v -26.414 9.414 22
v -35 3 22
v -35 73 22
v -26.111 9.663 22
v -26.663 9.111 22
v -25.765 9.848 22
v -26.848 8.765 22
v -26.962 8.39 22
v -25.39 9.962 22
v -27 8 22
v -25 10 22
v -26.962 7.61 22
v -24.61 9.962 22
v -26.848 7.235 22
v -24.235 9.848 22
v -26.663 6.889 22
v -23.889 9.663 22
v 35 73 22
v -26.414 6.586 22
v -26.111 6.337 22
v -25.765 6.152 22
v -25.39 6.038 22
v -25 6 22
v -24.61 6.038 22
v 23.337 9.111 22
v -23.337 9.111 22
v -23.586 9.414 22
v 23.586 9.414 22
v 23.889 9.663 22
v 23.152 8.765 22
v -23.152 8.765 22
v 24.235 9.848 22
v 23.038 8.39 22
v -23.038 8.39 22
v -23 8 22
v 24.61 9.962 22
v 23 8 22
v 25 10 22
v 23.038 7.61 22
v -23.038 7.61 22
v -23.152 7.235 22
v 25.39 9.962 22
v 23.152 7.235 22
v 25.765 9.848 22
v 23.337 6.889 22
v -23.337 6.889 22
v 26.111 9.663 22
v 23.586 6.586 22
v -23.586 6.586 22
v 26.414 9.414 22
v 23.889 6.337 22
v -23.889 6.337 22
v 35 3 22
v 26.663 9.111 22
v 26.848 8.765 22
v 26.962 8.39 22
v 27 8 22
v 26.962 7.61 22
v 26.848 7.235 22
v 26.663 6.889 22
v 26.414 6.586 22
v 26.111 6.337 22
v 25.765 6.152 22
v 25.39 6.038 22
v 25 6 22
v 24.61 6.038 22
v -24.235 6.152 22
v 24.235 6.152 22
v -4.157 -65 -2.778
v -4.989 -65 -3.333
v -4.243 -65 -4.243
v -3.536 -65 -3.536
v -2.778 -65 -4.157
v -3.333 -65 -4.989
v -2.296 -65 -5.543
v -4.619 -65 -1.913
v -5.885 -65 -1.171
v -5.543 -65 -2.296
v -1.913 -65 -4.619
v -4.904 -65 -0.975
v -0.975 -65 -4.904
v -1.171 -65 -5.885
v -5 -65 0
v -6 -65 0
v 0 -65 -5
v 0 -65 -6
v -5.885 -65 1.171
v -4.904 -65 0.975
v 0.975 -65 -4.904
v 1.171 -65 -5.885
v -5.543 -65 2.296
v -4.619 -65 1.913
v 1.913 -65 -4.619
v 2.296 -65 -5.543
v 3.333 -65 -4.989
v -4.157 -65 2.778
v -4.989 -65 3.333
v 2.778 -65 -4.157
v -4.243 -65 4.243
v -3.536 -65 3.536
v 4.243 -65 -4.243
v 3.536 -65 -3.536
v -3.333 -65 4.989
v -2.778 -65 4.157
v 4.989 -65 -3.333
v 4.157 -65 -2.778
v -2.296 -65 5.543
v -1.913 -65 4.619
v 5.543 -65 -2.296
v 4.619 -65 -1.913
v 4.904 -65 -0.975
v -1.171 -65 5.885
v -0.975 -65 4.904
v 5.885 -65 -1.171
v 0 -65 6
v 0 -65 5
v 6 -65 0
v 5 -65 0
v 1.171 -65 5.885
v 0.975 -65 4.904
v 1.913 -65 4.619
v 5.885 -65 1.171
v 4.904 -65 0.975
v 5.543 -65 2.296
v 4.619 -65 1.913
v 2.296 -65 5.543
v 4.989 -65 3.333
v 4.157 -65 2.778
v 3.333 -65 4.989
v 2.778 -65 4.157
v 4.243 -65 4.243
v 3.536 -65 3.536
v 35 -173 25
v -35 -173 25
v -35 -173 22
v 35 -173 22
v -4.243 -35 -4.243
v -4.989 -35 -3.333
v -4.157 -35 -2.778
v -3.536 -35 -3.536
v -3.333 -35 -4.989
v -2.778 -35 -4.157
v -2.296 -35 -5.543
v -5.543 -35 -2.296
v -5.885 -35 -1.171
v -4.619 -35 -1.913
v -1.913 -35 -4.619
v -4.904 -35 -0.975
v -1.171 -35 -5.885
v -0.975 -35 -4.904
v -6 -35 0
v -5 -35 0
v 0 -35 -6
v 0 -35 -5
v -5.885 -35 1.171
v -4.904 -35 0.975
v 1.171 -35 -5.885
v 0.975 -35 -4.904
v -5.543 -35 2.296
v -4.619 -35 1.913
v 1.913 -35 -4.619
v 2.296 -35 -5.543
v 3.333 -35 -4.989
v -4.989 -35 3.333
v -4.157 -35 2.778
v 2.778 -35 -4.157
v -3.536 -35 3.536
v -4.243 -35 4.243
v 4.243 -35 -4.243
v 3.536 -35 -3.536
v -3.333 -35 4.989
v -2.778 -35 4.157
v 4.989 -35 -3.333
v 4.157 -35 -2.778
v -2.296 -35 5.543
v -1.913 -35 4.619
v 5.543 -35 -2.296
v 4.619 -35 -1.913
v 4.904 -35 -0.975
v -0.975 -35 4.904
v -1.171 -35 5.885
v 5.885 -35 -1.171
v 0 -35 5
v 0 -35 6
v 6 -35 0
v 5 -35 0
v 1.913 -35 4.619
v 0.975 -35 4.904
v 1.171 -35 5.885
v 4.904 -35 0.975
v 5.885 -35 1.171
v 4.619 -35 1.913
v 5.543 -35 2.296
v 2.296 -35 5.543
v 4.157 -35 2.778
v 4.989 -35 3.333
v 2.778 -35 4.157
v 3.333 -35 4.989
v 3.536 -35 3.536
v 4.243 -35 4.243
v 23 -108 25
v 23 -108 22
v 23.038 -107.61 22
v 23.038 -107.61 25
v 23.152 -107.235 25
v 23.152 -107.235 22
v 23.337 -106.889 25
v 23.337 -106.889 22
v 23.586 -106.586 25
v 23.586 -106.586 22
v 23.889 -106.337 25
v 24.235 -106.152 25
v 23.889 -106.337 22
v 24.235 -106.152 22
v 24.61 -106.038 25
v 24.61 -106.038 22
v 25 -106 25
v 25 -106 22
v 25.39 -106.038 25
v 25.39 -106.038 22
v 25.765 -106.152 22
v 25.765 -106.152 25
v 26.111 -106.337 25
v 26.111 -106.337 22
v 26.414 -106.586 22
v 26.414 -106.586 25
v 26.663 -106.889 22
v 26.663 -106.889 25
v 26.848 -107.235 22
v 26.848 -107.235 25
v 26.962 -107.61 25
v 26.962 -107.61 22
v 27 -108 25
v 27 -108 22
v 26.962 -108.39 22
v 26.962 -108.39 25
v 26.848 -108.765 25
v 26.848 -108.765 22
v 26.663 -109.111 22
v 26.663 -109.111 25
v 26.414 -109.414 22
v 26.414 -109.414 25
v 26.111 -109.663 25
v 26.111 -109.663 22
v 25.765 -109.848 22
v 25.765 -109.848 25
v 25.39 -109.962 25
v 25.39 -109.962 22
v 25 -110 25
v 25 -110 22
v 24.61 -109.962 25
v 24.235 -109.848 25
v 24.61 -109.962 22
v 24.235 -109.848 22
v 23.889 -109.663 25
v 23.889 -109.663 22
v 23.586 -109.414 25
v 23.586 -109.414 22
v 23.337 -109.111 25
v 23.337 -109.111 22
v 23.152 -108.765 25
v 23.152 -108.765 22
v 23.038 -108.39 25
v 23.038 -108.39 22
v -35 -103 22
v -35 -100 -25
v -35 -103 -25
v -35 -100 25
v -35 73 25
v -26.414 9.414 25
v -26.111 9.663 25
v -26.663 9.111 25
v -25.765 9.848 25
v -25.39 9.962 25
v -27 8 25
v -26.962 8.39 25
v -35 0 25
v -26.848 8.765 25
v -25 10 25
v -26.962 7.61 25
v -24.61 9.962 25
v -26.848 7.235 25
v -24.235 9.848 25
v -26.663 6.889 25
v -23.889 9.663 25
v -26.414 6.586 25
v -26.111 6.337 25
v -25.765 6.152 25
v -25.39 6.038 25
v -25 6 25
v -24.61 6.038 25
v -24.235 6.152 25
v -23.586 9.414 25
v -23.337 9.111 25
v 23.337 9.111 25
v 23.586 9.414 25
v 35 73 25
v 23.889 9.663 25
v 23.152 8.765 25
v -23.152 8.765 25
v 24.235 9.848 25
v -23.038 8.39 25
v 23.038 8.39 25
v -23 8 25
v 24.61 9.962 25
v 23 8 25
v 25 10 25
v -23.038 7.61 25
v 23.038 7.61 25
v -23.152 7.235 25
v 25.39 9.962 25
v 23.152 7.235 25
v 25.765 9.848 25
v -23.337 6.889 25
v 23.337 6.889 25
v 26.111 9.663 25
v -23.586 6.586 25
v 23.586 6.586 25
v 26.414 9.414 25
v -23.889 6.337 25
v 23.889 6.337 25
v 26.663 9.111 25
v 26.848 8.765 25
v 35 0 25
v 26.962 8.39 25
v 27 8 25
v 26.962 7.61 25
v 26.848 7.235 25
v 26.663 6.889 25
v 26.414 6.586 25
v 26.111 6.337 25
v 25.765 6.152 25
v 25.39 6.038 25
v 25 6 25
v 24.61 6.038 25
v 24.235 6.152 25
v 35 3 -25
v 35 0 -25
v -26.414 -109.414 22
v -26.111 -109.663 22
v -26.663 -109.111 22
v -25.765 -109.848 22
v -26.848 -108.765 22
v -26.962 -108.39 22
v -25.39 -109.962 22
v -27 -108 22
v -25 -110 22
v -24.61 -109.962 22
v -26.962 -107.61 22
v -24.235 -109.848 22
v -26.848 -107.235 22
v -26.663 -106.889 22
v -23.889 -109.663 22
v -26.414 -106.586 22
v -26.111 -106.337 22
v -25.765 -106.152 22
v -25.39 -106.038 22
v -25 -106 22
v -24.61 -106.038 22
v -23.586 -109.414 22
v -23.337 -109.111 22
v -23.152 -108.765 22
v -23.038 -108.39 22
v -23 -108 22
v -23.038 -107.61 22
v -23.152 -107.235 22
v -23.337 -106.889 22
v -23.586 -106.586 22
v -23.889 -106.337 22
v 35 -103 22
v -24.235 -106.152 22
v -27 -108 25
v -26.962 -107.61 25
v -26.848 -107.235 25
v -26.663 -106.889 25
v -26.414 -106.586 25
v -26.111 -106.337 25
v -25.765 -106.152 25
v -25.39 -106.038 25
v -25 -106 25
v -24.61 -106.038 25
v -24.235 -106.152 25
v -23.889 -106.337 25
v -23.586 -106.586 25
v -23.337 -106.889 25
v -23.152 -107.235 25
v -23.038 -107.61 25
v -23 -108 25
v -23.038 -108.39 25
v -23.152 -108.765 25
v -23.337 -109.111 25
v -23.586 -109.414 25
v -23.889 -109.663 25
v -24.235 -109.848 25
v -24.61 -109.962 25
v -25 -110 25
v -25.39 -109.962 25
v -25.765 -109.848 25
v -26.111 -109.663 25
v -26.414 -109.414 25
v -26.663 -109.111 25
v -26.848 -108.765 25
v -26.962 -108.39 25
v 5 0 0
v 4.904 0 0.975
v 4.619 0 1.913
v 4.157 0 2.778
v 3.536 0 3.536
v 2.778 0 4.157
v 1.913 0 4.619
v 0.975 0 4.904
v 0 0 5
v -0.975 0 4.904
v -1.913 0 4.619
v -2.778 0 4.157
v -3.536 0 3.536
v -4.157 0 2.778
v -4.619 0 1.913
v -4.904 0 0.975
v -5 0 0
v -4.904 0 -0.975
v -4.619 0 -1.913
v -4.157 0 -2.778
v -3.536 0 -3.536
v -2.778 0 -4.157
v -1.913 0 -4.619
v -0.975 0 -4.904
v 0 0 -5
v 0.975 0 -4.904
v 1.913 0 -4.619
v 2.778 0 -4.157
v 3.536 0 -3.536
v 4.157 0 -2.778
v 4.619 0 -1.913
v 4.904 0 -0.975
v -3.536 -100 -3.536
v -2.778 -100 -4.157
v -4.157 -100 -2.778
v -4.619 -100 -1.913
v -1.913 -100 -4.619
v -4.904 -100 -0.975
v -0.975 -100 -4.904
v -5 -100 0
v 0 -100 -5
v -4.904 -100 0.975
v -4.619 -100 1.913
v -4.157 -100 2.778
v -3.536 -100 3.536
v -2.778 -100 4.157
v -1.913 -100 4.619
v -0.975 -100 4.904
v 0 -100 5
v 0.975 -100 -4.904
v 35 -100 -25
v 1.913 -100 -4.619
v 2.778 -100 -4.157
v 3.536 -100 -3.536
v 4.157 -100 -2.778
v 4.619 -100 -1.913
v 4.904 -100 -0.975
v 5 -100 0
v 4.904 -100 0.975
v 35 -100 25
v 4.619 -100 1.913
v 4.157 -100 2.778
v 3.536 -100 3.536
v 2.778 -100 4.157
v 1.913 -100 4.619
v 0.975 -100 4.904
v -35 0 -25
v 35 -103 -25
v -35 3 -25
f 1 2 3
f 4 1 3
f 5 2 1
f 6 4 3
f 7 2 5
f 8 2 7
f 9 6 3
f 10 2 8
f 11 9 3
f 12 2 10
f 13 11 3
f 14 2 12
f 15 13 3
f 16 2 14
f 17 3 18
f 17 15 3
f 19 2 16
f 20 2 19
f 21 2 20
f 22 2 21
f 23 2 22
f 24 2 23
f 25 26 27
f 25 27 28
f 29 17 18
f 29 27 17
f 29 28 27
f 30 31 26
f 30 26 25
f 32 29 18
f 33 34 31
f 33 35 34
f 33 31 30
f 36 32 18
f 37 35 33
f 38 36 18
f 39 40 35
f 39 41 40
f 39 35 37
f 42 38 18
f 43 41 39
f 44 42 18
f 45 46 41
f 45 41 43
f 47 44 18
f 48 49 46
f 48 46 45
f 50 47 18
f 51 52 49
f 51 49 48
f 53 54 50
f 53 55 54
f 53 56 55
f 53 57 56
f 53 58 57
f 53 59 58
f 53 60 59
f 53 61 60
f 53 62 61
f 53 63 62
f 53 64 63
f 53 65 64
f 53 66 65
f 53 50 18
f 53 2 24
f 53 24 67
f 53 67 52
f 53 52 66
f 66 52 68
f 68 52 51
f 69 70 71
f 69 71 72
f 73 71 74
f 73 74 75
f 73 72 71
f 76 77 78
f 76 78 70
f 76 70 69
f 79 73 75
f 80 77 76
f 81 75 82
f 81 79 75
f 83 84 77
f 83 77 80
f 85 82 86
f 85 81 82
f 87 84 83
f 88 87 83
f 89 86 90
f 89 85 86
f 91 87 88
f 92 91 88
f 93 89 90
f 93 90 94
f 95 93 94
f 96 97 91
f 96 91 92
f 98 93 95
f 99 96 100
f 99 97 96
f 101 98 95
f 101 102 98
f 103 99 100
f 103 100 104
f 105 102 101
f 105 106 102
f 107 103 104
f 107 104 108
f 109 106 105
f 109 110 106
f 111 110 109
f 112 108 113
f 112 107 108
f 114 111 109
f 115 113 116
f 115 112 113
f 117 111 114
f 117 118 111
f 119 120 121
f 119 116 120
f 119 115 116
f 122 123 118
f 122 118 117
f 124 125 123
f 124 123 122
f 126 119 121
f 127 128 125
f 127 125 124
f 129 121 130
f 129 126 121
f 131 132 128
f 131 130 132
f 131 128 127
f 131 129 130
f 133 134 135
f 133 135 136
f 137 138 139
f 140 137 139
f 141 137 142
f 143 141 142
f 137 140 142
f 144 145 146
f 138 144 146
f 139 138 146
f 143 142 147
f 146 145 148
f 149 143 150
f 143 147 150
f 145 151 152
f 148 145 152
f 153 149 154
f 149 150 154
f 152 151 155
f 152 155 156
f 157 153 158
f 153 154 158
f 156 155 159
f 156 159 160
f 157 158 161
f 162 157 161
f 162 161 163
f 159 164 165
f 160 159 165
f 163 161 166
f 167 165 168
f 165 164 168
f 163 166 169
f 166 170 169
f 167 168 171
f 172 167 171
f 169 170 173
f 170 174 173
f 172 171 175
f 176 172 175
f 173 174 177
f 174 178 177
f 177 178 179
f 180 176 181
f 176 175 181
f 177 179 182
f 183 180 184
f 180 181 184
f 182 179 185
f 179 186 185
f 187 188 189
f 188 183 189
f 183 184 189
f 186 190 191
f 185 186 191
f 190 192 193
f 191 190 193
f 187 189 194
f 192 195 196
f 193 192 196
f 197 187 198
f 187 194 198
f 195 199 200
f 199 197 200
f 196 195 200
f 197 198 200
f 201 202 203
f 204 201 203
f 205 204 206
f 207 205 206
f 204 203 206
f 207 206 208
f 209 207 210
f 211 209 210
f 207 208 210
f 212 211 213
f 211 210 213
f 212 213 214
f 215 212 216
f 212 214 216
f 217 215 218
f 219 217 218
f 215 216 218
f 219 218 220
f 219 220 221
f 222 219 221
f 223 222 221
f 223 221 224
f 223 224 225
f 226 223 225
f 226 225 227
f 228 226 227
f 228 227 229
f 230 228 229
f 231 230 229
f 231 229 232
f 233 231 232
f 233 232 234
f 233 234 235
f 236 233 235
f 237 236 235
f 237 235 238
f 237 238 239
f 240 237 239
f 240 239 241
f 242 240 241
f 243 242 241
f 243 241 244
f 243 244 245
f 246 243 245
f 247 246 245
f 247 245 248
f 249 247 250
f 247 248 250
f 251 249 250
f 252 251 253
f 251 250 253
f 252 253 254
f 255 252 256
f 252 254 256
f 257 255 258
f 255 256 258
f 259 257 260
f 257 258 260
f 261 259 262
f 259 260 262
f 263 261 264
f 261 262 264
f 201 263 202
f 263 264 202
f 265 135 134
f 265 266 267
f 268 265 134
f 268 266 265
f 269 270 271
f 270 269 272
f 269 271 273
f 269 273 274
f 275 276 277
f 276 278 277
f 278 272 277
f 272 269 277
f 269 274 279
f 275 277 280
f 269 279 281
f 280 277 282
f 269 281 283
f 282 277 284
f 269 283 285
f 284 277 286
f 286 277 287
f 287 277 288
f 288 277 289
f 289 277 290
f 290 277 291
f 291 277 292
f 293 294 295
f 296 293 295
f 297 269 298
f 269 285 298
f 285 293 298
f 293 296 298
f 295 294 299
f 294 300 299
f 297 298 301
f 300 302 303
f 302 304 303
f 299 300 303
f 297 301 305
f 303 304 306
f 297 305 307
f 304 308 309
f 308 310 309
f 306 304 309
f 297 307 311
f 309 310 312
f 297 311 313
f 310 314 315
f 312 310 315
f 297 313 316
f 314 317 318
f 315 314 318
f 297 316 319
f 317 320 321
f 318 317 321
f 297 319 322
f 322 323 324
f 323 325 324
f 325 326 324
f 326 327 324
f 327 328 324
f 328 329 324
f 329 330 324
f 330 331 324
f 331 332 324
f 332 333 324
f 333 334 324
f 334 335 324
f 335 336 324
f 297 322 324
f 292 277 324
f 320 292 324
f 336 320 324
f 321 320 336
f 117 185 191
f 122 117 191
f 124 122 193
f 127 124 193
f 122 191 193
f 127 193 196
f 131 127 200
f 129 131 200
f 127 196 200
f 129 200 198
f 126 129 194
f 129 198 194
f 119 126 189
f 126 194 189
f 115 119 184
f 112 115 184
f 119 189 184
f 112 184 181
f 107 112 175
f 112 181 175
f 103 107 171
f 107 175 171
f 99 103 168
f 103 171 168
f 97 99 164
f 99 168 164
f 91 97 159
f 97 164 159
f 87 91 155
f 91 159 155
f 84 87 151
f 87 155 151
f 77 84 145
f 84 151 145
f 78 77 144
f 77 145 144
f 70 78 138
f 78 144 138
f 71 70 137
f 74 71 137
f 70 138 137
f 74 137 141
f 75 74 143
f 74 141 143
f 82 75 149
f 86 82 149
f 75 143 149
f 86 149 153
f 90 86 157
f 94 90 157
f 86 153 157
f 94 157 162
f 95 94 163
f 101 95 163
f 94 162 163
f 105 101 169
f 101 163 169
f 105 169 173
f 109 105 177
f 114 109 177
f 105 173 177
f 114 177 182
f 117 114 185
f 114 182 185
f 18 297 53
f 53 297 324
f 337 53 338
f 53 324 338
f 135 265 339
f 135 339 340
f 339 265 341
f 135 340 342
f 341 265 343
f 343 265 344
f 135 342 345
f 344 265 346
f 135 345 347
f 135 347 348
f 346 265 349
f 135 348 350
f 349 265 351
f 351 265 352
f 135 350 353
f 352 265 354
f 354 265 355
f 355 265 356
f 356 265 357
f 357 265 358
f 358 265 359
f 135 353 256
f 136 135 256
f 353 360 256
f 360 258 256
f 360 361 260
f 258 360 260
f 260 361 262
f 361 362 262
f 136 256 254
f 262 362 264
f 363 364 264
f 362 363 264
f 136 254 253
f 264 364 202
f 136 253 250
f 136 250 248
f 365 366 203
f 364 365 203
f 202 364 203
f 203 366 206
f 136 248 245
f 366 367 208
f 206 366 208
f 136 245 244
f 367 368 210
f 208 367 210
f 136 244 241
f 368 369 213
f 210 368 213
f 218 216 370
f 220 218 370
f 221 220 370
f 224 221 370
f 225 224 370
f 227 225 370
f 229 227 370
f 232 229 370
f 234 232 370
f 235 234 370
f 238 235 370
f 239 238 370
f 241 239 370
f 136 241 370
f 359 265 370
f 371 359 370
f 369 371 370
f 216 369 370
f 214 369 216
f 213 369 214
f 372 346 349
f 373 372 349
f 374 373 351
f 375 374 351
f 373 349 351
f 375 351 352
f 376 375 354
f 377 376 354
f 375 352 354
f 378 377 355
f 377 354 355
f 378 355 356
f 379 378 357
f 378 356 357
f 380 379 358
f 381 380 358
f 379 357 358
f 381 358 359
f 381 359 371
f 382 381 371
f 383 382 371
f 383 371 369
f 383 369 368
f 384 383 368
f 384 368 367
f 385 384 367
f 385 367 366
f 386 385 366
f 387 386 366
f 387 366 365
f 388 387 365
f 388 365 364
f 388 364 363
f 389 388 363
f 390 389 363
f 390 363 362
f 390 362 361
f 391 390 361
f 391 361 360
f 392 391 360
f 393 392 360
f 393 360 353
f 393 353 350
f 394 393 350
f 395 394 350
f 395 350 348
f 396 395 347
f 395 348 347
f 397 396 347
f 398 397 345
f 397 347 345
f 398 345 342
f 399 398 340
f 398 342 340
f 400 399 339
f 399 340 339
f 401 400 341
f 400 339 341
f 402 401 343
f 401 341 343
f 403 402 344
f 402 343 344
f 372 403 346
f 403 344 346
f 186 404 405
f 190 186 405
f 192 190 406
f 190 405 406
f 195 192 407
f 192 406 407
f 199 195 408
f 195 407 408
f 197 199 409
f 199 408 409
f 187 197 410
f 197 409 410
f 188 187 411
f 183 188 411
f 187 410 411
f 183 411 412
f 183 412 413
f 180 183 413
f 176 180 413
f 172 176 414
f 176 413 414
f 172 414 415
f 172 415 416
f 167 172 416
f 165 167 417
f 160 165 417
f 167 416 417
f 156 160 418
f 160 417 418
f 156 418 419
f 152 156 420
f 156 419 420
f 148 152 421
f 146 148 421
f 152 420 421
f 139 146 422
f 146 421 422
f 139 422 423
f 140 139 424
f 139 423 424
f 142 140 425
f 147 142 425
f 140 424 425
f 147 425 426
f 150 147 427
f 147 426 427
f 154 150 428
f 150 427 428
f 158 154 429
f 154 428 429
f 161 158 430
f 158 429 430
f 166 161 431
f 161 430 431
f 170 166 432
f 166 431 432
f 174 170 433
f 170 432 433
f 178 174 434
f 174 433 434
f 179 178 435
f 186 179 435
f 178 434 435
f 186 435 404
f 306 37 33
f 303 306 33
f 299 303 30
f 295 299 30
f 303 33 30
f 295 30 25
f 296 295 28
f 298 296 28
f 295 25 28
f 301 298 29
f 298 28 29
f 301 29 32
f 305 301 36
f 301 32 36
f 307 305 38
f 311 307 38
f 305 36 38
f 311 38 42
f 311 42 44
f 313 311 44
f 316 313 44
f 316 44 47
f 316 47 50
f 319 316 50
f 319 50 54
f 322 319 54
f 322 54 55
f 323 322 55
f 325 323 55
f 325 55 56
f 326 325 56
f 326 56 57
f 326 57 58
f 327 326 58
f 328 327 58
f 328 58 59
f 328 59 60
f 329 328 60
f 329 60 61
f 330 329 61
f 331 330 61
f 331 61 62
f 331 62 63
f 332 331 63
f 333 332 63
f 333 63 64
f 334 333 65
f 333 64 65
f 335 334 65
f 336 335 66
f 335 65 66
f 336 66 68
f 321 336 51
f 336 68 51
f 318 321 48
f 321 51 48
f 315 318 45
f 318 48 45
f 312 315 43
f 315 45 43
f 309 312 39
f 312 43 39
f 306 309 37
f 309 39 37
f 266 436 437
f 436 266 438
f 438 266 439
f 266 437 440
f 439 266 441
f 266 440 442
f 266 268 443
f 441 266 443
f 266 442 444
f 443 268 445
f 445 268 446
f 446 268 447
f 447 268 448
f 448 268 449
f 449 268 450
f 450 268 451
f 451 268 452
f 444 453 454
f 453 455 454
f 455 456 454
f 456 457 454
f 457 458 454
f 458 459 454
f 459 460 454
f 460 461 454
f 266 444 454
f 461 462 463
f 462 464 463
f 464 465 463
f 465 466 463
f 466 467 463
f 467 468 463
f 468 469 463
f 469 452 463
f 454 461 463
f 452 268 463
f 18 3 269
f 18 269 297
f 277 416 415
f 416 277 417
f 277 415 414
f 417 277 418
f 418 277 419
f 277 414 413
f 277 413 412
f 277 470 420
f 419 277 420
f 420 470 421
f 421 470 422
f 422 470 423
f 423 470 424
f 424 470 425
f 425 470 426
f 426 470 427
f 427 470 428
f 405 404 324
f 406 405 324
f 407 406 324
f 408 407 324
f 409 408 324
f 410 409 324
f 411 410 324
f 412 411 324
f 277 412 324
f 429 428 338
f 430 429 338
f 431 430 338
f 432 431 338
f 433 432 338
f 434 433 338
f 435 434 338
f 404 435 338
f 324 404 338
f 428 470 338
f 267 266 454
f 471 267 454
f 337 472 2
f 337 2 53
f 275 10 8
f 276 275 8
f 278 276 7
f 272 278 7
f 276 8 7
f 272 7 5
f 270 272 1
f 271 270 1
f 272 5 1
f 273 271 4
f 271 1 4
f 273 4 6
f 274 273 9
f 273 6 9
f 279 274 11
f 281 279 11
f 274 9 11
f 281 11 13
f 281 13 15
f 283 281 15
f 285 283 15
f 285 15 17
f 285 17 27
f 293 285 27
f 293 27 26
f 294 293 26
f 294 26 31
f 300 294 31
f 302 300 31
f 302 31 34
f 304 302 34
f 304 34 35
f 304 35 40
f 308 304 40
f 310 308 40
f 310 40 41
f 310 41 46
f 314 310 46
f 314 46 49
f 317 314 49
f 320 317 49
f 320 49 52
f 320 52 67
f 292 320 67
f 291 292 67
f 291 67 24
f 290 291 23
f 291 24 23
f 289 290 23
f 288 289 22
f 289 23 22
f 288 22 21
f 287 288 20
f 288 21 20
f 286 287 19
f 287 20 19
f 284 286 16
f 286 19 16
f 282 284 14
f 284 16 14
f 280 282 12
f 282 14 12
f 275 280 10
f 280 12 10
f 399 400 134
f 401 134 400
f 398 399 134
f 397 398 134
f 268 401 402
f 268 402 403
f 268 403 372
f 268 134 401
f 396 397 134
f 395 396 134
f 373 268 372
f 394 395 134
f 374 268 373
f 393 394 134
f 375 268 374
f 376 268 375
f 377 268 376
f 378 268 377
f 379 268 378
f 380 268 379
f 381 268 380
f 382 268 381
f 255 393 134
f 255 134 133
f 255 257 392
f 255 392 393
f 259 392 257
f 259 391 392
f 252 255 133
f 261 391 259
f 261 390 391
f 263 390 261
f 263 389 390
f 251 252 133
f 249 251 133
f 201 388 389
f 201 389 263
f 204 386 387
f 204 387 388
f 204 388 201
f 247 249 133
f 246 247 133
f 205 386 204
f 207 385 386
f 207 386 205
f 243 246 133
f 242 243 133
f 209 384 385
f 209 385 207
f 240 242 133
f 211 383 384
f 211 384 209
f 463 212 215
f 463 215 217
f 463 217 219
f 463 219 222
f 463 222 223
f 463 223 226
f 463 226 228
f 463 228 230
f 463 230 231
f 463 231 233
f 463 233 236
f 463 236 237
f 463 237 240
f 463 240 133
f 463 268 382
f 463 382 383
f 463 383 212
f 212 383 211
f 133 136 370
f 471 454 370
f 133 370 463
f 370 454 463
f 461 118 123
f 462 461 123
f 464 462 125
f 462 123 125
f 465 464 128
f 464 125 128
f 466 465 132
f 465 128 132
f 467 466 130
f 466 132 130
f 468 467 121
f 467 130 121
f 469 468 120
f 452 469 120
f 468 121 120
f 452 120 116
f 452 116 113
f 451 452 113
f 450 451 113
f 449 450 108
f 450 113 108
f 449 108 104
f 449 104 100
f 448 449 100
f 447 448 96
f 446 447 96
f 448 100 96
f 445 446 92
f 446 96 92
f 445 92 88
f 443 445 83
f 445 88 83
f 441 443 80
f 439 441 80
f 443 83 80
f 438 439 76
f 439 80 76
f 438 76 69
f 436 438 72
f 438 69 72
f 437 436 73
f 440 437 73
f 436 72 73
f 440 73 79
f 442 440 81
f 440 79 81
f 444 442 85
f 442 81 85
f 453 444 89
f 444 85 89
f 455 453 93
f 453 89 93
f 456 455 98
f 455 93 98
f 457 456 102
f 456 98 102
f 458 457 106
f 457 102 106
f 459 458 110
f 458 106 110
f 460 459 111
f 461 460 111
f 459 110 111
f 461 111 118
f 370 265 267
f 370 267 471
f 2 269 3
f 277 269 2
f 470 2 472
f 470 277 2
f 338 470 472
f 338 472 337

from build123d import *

# Parameters (mm, degrees)
SKETCH1_W           = 70
SKETCH1_H           = 50
BOSS_EXTRUDE1_DEPTH = 3
SKETCH2_W           = 70
SKETCH2_H           = 3
BOSS_EXTRUDE2_DEPTH = 70
SKETCH3_R           = 2
CUT_EXTRUDE1_DEPTH  = 6
SKETCH4_R           = 5
BOSS_EXTRUDE3_DEPTH = 35
SKETCH5_R           = 6
BOSS_EXTRUDE4_DEPTH = 30
SKETCH6_R           = 5
BOSS_EXTRUDE5_DEPTH = 35
SKETCH7_W           = 70
SKETCH7_H           = 50
BOSS_EXTRUDE6_DEPTH = 3
SKETCH8_W           = 70
SKETCH8_H           = 3
BOSS_EXTRUDE7_DEPTH = 70
SKETCH9_R           = 2
CUT_EXTRUDE2_DEPTH  = 70


with BuildPart() as part:
    # Sketch1 → Boss-Extrude1 (new body)
    with BuildSketch(Plane(origin=(0, 0, 0), x_dir=(1, 0, 0), z_dir=(0, 1, 0))):
        Rectangle(SKETCH1_W, SKETCH1_H)
    extrude(amount=BOSS_EXTRUDE1_DEPTH)

    # Sketch2 → Boss-Extrude2 (add)
    with BuildSketch(Plane(origin=(0, 3, 0), x_dir=(1, 0, 0), z_dir=(0, 1, 0))):
        with Locations((0, -23.5)):
            Rectangle(SKETCH2_W, SKETCH2_H)
    extrude(amount=BOSS_EXTRUDE2_DEPTH)

    # Sketch3 → Cut-Extrude1 (cut)
    with BuildSketch(Plane(origin=(0, 0, 22), x_dir=(-1, 0, 0), z_dir=(0, 0, -1))):
        with Locations((25, 8)):
            Circle(SKETCH3_R)
        with Locations((-25, 8)):
            Circle(SKETCH3_R)
    extrude(amount=-CUT_EXTRUDE1_DEPTH, mode=Mode.SUBTRACT)

    # Sketch4 → Boss-Extrude3 (add)
    with BuildSketch(Plane.XZ):
        Circle(SKETCH4_R)
    extrude(amount=BOSS_EXTRUDE3_DEPTH)

    # Sketch5 → Boss-Extrude4 (add)
    with BuildSketch(Plane.XZ.offset(35)):
        Circle(SKETCH5_R)
    extrude(amount=BOSS_EXTRUDE4_DEPTH)

    # Sketch6 → Boss-Extrude5 (add)
    with BuildSketch(Plane.XZ.offset(65)):
        Circle(SKETCH6_R)
    extrude(amount=BOSS_EXTRUDE5_DEPTH)

    # Sketch7 → Boss-Extrude6 (add)
    with BuildSketch(Plane.XZ.offset(100)):
        Rectangle(SKETCH7_W, SKETCH7_H)
    extrude(amount=BOSS_EXTRUDE6_DEPTH)

    # Sketch8 → Boss-Extrude7 (add)
    with BuildSketch(Plane.XZ.offset(103)):
        with Locations((0, 23.5)):
            Rectangle(SKETCH8_W, SKETCH8_H)
    extrude(amount=BOSS_EXTRUDE7_DEPTH)

    # Sketch9 → Cut-Extrude2 (cut)
    with BuildSketch(Plane(origin=(0, 0, 22), x_dir=(-1, 0, 0), z_dir=(0, 0, -1))):
        with Locations((-25, -108)):
            Circle(SKETCH9_R)
        with Locations((25, -108)):
            Circle(SKETCH9_R)
    extrude(amount=-CUT_EXTRUDE2_DEPTH, mode=Mode.SUBTRACT)


solid = part.part
